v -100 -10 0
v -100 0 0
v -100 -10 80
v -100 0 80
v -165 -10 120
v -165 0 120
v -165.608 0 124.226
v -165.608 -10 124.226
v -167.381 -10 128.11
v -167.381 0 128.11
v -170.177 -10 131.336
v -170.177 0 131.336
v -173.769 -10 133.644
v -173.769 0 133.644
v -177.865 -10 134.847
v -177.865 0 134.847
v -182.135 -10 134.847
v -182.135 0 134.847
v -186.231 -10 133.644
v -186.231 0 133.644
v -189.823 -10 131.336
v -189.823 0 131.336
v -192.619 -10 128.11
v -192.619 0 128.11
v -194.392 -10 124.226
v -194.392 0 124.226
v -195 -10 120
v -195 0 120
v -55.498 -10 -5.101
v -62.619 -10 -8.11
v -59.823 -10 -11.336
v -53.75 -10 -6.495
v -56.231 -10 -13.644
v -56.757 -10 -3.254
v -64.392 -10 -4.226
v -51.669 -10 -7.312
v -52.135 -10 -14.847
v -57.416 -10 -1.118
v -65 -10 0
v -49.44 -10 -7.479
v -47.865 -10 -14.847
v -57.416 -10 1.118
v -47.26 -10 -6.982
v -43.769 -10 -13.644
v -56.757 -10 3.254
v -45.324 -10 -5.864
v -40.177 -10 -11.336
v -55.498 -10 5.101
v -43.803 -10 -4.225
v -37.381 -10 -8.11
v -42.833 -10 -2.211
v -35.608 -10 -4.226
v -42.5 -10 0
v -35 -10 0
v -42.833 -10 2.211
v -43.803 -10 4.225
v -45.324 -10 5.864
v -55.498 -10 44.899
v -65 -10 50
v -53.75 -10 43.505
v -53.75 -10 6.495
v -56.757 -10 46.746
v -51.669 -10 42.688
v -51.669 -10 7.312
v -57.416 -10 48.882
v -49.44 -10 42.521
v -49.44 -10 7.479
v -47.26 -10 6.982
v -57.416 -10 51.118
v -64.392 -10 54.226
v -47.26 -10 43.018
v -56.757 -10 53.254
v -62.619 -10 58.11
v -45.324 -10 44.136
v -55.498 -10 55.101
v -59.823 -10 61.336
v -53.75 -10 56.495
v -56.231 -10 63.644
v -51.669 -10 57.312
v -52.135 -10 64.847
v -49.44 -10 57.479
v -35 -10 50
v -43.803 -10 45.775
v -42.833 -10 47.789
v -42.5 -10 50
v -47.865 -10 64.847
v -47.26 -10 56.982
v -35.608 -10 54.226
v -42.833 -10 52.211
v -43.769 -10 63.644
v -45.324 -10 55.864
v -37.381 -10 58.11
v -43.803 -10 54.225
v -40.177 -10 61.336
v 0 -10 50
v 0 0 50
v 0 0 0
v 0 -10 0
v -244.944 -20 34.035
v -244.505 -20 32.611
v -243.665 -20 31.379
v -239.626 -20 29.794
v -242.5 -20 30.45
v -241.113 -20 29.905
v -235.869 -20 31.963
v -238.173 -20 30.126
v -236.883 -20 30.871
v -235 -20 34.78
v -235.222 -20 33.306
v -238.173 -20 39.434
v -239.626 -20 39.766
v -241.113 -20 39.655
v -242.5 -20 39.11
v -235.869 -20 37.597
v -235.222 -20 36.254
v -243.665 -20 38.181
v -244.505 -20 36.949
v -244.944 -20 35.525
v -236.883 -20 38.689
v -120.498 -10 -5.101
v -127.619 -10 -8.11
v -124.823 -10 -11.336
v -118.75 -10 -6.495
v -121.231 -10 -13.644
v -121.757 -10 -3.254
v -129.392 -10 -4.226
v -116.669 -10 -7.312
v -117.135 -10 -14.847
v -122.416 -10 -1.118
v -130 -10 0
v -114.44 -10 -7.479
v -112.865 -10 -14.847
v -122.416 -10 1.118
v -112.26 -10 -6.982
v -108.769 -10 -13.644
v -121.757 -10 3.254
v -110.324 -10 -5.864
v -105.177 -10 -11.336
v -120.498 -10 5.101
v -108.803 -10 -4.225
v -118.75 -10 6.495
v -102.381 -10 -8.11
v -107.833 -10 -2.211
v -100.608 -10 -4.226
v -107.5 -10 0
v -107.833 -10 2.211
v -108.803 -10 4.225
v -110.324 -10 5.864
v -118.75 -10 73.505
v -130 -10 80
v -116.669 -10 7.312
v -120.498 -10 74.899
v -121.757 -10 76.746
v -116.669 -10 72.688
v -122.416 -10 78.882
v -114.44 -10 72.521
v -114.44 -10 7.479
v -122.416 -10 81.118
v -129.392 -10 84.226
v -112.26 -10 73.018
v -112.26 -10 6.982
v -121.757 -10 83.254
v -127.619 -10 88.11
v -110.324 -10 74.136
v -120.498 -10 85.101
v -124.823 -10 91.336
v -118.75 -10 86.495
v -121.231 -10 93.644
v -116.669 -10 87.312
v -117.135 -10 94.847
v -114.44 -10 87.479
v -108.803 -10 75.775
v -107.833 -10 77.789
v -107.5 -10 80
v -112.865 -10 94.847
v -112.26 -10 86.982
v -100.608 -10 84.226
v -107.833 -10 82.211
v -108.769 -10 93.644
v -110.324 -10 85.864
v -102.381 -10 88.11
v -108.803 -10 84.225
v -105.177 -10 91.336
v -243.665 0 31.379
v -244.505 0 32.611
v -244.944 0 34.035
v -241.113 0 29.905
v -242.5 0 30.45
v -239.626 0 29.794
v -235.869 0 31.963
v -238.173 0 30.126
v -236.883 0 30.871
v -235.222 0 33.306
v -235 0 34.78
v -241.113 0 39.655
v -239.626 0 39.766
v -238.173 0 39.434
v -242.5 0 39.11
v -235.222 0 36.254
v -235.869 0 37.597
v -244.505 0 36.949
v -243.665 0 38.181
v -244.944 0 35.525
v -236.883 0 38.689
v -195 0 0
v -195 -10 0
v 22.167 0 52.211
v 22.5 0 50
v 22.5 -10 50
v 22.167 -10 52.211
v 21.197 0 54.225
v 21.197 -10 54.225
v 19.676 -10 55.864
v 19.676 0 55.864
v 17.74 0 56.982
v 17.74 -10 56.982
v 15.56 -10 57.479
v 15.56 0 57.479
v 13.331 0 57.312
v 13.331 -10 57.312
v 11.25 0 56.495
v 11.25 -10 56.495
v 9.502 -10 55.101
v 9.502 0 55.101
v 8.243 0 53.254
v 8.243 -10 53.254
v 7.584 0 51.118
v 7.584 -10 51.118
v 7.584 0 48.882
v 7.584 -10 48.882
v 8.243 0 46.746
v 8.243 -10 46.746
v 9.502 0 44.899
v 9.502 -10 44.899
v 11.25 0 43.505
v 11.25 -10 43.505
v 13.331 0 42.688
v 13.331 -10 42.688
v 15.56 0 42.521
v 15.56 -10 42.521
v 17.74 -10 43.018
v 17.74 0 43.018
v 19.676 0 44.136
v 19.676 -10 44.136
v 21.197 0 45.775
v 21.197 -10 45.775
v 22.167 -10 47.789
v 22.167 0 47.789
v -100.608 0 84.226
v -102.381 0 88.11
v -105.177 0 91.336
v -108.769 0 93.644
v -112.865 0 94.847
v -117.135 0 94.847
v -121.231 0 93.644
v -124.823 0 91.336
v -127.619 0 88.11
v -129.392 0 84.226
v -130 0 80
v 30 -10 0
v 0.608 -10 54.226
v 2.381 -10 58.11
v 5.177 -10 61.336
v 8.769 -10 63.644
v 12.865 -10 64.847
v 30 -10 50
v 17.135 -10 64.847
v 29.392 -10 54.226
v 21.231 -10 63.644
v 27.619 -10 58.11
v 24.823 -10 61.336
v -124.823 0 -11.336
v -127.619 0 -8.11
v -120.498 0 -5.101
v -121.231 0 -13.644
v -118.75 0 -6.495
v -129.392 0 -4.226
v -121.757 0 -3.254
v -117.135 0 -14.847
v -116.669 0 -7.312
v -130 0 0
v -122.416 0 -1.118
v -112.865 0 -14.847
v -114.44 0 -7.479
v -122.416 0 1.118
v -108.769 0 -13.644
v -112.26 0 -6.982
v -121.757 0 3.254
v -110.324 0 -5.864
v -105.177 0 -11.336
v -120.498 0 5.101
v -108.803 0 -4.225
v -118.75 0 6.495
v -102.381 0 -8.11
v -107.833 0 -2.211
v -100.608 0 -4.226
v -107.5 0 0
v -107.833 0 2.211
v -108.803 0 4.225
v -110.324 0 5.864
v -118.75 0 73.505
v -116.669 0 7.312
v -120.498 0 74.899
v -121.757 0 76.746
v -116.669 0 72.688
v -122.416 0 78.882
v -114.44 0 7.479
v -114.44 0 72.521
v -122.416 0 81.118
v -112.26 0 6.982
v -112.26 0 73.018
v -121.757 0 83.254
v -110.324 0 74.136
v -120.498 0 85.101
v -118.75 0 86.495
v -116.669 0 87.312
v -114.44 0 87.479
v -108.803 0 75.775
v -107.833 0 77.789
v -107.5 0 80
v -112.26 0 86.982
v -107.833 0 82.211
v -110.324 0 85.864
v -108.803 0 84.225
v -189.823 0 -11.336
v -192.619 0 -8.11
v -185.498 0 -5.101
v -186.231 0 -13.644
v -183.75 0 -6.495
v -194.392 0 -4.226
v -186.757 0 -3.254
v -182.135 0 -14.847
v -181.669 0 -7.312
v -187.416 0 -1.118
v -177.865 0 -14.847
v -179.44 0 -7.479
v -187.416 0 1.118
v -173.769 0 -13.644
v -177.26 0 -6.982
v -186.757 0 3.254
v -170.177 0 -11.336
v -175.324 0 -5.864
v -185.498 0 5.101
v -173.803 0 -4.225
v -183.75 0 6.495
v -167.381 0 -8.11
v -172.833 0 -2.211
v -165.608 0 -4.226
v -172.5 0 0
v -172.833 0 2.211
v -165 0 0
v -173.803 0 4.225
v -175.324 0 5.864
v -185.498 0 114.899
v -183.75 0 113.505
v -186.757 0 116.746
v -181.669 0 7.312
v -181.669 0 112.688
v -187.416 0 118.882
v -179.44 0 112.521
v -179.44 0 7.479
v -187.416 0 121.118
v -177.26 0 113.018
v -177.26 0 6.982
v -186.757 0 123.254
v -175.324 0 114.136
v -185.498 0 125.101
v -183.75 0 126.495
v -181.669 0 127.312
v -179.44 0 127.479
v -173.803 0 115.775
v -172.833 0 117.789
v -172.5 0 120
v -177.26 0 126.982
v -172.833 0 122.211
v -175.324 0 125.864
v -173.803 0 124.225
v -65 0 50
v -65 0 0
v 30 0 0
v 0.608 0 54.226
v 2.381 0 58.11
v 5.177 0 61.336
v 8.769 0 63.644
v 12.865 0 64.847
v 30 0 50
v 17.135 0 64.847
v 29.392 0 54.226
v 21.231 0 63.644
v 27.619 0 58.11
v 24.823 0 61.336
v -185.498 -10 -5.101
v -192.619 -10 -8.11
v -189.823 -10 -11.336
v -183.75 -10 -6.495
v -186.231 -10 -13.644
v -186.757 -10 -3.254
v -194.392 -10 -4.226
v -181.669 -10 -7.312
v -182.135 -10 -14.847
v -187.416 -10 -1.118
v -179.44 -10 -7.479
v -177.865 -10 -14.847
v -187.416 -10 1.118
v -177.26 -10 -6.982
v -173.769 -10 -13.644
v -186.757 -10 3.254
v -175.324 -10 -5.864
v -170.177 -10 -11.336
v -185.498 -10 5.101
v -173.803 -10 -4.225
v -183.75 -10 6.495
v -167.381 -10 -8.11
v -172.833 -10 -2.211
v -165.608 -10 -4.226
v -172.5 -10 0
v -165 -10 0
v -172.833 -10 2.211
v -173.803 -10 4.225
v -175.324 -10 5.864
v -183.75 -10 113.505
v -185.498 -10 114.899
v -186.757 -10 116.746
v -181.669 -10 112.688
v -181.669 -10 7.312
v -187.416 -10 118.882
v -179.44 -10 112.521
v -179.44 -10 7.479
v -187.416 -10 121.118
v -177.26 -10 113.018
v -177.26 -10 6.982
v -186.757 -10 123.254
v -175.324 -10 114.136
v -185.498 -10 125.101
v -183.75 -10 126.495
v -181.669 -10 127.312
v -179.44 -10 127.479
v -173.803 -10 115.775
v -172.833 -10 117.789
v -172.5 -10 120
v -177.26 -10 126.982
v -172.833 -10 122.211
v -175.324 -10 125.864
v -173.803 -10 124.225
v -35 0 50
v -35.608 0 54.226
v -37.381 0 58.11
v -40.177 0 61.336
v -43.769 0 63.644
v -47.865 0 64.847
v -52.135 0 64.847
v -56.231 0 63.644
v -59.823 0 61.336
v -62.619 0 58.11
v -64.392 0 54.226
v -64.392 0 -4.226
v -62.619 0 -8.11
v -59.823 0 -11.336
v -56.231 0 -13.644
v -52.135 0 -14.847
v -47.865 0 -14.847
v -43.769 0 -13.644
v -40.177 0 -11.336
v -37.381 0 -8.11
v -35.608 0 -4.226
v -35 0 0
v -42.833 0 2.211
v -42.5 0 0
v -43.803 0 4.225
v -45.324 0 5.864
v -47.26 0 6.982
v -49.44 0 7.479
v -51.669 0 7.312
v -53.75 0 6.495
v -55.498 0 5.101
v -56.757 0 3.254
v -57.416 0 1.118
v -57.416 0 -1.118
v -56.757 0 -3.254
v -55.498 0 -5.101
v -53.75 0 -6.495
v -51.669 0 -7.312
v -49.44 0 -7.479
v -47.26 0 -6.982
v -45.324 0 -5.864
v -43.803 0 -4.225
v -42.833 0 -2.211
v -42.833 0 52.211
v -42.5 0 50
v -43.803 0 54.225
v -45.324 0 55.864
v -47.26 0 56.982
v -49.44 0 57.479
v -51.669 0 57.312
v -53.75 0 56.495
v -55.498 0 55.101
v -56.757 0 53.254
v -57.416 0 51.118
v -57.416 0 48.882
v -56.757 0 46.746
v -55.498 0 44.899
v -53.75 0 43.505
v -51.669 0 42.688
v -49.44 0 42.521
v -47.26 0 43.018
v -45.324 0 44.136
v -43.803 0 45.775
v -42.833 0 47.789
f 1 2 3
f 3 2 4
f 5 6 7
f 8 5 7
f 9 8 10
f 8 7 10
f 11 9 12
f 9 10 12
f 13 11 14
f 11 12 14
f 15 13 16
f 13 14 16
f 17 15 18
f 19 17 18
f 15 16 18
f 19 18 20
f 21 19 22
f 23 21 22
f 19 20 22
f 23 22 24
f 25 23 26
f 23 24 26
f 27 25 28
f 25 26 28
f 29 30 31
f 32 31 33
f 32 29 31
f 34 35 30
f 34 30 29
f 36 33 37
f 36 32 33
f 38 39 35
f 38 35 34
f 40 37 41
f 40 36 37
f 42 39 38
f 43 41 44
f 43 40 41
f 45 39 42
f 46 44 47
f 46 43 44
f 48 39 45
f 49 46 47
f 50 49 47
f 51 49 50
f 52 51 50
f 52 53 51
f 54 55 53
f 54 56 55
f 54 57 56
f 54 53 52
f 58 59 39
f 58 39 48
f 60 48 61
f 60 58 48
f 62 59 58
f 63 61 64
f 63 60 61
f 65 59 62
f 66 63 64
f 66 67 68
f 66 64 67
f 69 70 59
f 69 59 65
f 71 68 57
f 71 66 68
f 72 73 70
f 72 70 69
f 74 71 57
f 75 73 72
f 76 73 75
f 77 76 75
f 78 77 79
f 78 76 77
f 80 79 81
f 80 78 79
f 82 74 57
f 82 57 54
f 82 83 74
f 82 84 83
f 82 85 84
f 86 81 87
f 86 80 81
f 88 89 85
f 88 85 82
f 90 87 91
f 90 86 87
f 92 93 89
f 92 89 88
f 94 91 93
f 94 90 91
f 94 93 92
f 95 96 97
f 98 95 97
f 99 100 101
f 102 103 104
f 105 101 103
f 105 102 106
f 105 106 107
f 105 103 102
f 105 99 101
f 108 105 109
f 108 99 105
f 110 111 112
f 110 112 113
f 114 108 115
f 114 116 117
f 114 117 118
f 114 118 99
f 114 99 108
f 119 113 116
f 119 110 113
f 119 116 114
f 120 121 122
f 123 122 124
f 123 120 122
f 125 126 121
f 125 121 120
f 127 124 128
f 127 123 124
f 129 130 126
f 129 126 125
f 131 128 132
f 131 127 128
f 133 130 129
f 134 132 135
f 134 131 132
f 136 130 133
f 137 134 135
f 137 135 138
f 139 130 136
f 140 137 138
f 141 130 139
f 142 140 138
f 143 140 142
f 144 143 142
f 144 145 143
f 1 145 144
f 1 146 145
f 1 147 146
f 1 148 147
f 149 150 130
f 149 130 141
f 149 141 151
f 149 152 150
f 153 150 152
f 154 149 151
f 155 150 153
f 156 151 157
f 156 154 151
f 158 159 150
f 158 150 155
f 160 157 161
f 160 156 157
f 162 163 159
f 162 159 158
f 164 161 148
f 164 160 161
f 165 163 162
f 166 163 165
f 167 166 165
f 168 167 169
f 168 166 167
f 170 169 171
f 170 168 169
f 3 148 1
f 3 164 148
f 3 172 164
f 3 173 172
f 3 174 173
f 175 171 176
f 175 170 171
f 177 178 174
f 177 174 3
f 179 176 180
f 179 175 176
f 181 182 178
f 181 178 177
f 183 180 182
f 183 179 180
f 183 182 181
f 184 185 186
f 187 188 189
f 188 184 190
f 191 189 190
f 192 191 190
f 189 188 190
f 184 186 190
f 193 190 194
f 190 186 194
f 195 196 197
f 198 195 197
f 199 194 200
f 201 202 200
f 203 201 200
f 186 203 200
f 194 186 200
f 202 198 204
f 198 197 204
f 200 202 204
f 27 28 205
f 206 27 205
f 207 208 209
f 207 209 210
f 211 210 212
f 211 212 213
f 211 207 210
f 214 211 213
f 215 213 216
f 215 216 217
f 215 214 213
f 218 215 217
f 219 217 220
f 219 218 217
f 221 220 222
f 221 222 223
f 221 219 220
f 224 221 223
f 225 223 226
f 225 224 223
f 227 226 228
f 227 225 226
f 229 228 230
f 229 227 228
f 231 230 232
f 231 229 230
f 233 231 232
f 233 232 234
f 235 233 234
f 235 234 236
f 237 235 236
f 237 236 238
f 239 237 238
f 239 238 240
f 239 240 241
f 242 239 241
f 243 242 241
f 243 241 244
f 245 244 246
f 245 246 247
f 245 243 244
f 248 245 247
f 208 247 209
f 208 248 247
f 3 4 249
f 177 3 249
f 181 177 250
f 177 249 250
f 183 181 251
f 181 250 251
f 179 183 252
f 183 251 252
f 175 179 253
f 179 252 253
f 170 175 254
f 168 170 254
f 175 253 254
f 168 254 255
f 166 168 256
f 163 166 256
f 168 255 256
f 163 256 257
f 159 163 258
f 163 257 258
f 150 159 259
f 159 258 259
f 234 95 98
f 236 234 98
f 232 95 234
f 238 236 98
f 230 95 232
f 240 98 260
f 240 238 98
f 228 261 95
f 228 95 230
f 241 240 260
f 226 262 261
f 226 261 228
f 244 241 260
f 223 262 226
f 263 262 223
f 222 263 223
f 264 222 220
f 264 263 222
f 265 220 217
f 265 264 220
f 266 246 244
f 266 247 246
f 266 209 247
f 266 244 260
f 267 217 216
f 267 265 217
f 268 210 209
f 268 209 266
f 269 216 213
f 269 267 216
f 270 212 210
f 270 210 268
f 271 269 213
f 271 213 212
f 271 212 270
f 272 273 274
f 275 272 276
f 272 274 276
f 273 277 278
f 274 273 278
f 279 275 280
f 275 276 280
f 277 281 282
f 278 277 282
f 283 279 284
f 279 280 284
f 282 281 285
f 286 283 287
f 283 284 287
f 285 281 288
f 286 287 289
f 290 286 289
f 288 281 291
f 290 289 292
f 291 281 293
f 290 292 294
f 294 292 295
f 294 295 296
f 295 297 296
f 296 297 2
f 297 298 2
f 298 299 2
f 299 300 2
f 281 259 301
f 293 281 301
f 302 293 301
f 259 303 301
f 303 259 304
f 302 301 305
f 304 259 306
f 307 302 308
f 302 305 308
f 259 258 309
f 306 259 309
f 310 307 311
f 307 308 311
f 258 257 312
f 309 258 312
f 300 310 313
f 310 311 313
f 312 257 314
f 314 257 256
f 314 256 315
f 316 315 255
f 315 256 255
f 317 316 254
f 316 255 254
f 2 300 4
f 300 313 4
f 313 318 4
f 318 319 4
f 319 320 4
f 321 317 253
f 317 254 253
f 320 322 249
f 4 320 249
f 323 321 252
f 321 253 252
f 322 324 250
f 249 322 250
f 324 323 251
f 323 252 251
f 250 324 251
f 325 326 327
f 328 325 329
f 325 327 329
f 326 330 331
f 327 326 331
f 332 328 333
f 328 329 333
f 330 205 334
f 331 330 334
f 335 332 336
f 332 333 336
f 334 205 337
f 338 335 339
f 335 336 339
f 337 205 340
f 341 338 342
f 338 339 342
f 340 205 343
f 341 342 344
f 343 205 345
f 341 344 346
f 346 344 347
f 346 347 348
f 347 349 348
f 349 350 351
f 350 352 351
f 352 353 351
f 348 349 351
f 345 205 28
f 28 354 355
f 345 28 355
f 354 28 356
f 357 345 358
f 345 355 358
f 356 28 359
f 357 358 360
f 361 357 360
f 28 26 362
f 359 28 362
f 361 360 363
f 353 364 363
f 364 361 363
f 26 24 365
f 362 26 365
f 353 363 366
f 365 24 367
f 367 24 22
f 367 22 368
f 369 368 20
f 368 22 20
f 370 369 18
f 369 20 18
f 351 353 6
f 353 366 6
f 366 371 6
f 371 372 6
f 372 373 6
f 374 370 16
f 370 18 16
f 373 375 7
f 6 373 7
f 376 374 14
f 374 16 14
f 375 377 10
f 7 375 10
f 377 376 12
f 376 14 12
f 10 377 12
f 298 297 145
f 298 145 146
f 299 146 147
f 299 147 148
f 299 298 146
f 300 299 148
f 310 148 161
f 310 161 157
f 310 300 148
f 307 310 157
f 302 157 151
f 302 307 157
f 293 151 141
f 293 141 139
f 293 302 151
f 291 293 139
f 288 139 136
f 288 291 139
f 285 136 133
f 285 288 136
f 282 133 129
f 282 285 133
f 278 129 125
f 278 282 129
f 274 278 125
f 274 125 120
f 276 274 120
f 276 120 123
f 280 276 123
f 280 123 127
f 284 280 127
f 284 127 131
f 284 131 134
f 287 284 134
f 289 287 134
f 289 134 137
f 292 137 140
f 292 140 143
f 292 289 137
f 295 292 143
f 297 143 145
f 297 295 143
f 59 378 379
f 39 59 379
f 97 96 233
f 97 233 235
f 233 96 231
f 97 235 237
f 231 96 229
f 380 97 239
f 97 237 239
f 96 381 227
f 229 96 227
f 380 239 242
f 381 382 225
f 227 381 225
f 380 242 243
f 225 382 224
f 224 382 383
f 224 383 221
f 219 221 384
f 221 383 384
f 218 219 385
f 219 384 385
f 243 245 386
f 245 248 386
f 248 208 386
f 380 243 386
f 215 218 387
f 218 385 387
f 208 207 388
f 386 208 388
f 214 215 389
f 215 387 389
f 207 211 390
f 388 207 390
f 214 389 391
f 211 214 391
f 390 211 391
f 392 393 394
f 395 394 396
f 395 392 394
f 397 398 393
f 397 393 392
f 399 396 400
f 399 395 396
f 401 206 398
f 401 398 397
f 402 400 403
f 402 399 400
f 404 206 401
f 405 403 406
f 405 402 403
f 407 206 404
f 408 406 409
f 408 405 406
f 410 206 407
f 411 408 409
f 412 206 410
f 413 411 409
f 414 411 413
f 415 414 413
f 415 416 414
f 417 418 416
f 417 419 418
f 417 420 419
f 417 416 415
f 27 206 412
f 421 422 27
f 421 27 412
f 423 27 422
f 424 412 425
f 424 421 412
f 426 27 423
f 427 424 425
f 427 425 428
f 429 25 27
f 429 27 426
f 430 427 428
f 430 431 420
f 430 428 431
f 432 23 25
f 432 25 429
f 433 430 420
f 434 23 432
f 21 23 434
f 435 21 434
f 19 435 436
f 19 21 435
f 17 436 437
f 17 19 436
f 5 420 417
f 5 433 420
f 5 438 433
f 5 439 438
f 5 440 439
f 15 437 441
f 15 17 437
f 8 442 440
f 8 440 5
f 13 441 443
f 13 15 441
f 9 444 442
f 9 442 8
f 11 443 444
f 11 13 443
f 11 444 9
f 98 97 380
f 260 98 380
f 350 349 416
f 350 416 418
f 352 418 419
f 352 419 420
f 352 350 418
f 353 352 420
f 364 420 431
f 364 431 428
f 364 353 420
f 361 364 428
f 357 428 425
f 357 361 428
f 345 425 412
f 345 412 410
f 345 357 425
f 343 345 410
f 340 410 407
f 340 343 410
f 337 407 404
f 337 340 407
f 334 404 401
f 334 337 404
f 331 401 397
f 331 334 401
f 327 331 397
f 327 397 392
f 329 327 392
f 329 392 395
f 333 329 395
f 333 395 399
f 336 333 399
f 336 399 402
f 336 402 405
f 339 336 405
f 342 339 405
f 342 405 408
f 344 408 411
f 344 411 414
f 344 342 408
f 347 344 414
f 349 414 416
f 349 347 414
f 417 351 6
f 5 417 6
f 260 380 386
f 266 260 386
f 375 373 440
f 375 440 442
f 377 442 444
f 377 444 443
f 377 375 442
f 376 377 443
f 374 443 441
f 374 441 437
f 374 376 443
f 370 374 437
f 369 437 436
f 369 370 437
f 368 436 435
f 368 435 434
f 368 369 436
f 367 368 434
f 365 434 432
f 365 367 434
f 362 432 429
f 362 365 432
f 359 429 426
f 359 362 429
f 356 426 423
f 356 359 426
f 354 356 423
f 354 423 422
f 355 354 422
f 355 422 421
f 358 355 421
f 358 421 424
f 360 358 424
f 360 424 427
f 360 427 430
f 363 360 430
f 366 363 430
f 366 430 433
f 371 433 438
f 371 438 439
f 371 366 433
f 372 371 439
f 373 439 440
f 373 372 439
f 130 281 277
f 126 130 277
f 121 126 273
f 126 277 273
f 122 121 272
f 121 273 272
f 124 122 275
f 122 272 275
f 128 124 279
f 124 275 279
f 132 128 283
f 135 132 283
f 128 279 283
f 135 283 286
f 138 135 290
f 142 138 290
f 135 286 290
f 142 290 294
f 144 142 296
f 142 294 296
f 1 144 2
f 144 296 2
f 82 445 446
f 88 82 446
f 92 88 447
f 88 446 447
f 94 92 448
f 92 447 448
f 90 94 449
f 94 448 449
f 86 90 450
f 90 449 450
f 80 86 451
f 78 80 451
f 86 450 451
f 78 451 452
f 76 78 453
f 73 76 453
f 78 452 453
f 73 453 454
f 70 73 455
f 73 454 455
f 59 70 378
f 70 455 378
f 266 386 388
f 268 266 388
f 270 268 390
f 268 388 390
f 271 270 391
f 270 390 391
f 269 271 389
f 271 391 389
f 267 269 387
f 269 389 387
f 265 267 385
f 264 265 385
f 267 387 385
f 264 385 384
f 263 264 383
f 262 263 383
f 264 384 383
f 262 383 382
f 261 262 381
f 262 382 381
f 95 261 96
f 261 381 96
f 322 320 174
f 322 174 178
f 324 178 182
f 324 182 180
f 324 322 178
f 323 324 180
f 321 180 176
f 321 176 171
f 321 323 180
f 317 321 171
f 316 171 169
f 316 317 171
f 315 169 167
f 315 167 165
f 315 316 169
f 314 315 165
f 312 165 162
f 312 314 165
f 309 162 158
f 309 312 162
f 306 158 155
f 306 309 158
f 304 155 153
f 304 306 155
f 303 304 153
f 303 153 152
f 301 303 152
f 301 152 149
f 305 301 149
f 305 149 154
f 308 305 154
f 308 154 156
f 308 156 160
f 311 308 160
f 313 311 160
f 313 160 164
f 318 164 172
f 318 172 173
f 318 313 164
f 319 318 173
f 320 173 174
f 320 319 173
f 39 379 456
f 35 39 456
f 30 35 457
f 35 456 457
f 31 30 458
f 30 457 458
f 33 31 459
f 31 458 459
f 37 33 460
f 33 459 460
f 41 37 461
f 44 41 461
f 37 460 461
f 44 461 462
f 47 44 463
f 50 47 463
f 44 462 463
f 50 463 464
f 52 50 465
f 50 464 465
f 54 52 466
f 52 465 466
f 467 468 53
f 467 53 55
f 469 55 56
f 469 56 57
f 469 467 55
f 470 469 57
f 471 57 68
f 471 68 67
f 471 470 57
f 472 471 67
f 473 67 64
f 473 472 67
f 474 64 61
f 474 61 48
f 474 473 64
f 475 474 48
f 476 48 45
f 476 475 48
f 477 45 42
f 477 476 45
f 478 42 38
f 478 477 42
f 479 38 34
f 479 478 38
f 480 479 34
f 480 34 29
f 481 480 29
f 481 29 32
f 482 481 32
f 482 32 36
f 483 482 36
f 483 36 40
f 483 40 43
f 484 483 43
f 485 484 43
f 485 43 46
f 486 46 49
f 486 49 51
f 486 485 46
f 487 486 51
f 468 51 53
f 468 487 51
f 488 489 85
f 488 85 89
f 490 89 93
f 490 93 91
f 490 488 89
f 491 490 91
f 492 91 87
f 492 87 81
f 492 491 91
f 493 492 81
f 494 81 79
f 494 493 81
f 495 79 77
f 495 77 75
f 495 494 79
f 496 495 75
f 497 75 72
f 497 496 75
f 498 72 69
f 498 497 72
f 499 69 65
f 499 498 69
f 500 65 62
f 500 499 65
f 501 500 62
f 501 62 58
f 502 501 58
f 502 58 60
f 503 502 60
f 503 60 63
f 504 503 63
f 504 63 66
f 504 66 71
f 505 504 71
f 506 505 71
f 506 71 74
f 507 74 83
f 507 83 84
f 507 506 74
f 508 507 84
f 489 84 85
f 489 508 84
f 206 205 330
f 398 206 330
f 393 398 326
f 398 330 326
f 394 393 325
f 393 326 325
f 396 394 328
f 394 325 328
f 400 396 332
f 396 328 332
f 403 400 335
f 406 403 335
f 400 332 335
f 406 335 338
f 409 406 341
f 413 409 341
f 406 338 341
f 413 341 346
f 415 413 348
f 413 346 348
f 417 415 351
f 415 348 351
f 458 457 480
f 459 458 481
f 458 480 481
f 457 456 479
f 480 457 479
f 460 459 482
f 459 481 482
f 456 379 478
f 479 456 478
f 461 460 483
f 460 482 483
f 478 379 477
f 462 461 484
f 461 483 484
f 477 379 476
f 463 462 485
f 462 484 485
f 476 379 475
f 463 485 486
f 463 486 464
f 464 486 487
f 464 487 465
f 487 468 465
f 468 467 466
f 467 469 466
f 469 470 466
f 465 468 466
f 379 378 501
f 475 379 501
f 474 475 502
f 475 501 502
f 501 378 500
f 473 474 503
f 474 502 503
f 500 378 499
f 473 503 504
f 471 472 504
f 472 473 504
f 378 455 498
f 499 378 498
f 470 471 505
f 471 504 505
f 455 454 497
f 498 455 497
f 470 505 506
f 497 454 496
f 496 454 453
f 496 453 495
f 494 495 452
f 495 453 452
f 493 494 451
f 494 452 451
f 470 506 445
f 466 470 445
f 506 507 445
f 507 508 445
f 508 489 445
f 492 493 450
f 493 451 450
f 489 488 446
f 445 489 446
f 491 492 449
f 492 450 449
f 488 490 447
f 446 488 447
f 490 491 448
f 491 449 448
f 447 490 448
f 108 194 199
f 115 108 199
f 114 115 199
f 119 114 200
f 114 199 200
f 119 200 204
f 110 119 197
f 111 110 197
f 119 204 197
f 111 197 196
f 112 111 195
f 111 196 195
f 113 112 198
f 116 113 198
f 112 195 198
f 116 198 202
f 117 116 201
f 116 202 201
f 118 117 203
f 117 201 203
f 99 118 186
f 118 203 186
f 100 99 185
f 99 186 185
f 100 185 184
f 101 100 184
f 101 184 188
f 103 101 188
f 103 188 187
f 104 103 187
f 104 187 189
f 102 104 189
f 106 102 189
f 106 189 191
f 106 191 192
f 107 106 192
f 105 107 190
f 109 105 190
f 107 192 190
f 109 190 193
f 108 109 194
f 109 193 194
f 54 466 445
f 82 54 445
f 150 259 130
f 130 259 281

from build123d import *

# Parameters (mm, degrees)
F1_R      = 7.5
F2_DEPTH  = 10
F3_R      = 7.5
F4_DEPTH  = 10
F5_R      = 7.5
F6_DEPTH  = 10
F7_R      = 7.5
F8_DEPTH  = 10
F9_R      = 5
F10_DEPTH = 20


with BuildPart() as f2:
    # F1 (on Front) → F2 (new body)
    with BuildSketch(Plane.XZ):
        with BuildLine():
            Line((0, 50), (0, 0))
            Line((0, 0), (30, 0))
            Line((30, 0), (30, 50))
            ThreePointArc((30, 50), (15, 65), (0, 50))
        make_face()
        with Locations((15, 50)):
            Circle(F1_R, mode=Mode.SUBTRACT)
    extrude(amount=F2_DEPTH)


with BuildPart() as f4:
    # F3 (on Front) → F4 (new body)
    with BuildSketch(Plane.XZ):
        with BuildLine():
            Line((-65, 50), (-65, 0))
            ThreePointArc((-65, 0), (-50, -15), (-35, 0))
            Line((-35, 0), (-35, 50))
            ThreePointArc((-35, 50), (-50, 65), (-65, 50))
        make_face()
        with Locations((-50, 0)):
            Circle(F3_R, mode=Mode.SUBTRACT)
        with Locations((-50, 50)):
            Circle(F3_R, mode=Mode.SUBTRACT)
    extrude(amount=F4_DEPTH)


with BuildPart() as f6:
    # F5 (on Front) → F6 (new body)
    with BuildSketch(Plane.XZ):
        with BuildLine():
            Line((-130, 80), (-130, 0))
            ThreePointArc((-130, 0), (-115, -15), (-100, 0))
            Line((-100, 0), (-100, 80))
            ThreePointArc((-100, 80), (-115, 95), (-130, 80))
        make_face()
        with Locations((-115, 0)):
            Circle(F5_R, mode=Mode.SUBTRACT)
        with Locations((-115, 80)):
            Circle(F5_R, mode=Mode.SUBTRACT)
    extrude(amount=F6_DEPTH)


with BuildPart() as f8:
    # F7 (on Front) → F8 (new body)
    with BuildSketch(Plane.XZ):
        with BuildLine():
            Line((-195, 120), (-195, 0))
            ThreePointArc((-195, 0), (-180, -15), (-165, 0))
            Line((-165, 0), (-165, 120))
            ThreePointArc((-165, 120), (-180, 135), (-195, 120))
        make_face()
        with Locations((-180, 0)):
            Circle(F7_R, mode=Mode.SUBTRACT)
        with Locations((-180, 120)):
            Circle(F7_R, mode=Mode.SUBTRACT)
    extrude(amount=F8_DEPTH)


with BuildPart() as f10:
    # F9 (on Front) → F10 (new body)
    with BuildSketch(Plane.XZ):
        with Locations((-240, 34.7799435258)):
            Circle(F9_R)
    extrude(amount=F10_DEPTH)


solid = Compound([f2.part, f4.part, f6.part, f8.part, f10.part])
